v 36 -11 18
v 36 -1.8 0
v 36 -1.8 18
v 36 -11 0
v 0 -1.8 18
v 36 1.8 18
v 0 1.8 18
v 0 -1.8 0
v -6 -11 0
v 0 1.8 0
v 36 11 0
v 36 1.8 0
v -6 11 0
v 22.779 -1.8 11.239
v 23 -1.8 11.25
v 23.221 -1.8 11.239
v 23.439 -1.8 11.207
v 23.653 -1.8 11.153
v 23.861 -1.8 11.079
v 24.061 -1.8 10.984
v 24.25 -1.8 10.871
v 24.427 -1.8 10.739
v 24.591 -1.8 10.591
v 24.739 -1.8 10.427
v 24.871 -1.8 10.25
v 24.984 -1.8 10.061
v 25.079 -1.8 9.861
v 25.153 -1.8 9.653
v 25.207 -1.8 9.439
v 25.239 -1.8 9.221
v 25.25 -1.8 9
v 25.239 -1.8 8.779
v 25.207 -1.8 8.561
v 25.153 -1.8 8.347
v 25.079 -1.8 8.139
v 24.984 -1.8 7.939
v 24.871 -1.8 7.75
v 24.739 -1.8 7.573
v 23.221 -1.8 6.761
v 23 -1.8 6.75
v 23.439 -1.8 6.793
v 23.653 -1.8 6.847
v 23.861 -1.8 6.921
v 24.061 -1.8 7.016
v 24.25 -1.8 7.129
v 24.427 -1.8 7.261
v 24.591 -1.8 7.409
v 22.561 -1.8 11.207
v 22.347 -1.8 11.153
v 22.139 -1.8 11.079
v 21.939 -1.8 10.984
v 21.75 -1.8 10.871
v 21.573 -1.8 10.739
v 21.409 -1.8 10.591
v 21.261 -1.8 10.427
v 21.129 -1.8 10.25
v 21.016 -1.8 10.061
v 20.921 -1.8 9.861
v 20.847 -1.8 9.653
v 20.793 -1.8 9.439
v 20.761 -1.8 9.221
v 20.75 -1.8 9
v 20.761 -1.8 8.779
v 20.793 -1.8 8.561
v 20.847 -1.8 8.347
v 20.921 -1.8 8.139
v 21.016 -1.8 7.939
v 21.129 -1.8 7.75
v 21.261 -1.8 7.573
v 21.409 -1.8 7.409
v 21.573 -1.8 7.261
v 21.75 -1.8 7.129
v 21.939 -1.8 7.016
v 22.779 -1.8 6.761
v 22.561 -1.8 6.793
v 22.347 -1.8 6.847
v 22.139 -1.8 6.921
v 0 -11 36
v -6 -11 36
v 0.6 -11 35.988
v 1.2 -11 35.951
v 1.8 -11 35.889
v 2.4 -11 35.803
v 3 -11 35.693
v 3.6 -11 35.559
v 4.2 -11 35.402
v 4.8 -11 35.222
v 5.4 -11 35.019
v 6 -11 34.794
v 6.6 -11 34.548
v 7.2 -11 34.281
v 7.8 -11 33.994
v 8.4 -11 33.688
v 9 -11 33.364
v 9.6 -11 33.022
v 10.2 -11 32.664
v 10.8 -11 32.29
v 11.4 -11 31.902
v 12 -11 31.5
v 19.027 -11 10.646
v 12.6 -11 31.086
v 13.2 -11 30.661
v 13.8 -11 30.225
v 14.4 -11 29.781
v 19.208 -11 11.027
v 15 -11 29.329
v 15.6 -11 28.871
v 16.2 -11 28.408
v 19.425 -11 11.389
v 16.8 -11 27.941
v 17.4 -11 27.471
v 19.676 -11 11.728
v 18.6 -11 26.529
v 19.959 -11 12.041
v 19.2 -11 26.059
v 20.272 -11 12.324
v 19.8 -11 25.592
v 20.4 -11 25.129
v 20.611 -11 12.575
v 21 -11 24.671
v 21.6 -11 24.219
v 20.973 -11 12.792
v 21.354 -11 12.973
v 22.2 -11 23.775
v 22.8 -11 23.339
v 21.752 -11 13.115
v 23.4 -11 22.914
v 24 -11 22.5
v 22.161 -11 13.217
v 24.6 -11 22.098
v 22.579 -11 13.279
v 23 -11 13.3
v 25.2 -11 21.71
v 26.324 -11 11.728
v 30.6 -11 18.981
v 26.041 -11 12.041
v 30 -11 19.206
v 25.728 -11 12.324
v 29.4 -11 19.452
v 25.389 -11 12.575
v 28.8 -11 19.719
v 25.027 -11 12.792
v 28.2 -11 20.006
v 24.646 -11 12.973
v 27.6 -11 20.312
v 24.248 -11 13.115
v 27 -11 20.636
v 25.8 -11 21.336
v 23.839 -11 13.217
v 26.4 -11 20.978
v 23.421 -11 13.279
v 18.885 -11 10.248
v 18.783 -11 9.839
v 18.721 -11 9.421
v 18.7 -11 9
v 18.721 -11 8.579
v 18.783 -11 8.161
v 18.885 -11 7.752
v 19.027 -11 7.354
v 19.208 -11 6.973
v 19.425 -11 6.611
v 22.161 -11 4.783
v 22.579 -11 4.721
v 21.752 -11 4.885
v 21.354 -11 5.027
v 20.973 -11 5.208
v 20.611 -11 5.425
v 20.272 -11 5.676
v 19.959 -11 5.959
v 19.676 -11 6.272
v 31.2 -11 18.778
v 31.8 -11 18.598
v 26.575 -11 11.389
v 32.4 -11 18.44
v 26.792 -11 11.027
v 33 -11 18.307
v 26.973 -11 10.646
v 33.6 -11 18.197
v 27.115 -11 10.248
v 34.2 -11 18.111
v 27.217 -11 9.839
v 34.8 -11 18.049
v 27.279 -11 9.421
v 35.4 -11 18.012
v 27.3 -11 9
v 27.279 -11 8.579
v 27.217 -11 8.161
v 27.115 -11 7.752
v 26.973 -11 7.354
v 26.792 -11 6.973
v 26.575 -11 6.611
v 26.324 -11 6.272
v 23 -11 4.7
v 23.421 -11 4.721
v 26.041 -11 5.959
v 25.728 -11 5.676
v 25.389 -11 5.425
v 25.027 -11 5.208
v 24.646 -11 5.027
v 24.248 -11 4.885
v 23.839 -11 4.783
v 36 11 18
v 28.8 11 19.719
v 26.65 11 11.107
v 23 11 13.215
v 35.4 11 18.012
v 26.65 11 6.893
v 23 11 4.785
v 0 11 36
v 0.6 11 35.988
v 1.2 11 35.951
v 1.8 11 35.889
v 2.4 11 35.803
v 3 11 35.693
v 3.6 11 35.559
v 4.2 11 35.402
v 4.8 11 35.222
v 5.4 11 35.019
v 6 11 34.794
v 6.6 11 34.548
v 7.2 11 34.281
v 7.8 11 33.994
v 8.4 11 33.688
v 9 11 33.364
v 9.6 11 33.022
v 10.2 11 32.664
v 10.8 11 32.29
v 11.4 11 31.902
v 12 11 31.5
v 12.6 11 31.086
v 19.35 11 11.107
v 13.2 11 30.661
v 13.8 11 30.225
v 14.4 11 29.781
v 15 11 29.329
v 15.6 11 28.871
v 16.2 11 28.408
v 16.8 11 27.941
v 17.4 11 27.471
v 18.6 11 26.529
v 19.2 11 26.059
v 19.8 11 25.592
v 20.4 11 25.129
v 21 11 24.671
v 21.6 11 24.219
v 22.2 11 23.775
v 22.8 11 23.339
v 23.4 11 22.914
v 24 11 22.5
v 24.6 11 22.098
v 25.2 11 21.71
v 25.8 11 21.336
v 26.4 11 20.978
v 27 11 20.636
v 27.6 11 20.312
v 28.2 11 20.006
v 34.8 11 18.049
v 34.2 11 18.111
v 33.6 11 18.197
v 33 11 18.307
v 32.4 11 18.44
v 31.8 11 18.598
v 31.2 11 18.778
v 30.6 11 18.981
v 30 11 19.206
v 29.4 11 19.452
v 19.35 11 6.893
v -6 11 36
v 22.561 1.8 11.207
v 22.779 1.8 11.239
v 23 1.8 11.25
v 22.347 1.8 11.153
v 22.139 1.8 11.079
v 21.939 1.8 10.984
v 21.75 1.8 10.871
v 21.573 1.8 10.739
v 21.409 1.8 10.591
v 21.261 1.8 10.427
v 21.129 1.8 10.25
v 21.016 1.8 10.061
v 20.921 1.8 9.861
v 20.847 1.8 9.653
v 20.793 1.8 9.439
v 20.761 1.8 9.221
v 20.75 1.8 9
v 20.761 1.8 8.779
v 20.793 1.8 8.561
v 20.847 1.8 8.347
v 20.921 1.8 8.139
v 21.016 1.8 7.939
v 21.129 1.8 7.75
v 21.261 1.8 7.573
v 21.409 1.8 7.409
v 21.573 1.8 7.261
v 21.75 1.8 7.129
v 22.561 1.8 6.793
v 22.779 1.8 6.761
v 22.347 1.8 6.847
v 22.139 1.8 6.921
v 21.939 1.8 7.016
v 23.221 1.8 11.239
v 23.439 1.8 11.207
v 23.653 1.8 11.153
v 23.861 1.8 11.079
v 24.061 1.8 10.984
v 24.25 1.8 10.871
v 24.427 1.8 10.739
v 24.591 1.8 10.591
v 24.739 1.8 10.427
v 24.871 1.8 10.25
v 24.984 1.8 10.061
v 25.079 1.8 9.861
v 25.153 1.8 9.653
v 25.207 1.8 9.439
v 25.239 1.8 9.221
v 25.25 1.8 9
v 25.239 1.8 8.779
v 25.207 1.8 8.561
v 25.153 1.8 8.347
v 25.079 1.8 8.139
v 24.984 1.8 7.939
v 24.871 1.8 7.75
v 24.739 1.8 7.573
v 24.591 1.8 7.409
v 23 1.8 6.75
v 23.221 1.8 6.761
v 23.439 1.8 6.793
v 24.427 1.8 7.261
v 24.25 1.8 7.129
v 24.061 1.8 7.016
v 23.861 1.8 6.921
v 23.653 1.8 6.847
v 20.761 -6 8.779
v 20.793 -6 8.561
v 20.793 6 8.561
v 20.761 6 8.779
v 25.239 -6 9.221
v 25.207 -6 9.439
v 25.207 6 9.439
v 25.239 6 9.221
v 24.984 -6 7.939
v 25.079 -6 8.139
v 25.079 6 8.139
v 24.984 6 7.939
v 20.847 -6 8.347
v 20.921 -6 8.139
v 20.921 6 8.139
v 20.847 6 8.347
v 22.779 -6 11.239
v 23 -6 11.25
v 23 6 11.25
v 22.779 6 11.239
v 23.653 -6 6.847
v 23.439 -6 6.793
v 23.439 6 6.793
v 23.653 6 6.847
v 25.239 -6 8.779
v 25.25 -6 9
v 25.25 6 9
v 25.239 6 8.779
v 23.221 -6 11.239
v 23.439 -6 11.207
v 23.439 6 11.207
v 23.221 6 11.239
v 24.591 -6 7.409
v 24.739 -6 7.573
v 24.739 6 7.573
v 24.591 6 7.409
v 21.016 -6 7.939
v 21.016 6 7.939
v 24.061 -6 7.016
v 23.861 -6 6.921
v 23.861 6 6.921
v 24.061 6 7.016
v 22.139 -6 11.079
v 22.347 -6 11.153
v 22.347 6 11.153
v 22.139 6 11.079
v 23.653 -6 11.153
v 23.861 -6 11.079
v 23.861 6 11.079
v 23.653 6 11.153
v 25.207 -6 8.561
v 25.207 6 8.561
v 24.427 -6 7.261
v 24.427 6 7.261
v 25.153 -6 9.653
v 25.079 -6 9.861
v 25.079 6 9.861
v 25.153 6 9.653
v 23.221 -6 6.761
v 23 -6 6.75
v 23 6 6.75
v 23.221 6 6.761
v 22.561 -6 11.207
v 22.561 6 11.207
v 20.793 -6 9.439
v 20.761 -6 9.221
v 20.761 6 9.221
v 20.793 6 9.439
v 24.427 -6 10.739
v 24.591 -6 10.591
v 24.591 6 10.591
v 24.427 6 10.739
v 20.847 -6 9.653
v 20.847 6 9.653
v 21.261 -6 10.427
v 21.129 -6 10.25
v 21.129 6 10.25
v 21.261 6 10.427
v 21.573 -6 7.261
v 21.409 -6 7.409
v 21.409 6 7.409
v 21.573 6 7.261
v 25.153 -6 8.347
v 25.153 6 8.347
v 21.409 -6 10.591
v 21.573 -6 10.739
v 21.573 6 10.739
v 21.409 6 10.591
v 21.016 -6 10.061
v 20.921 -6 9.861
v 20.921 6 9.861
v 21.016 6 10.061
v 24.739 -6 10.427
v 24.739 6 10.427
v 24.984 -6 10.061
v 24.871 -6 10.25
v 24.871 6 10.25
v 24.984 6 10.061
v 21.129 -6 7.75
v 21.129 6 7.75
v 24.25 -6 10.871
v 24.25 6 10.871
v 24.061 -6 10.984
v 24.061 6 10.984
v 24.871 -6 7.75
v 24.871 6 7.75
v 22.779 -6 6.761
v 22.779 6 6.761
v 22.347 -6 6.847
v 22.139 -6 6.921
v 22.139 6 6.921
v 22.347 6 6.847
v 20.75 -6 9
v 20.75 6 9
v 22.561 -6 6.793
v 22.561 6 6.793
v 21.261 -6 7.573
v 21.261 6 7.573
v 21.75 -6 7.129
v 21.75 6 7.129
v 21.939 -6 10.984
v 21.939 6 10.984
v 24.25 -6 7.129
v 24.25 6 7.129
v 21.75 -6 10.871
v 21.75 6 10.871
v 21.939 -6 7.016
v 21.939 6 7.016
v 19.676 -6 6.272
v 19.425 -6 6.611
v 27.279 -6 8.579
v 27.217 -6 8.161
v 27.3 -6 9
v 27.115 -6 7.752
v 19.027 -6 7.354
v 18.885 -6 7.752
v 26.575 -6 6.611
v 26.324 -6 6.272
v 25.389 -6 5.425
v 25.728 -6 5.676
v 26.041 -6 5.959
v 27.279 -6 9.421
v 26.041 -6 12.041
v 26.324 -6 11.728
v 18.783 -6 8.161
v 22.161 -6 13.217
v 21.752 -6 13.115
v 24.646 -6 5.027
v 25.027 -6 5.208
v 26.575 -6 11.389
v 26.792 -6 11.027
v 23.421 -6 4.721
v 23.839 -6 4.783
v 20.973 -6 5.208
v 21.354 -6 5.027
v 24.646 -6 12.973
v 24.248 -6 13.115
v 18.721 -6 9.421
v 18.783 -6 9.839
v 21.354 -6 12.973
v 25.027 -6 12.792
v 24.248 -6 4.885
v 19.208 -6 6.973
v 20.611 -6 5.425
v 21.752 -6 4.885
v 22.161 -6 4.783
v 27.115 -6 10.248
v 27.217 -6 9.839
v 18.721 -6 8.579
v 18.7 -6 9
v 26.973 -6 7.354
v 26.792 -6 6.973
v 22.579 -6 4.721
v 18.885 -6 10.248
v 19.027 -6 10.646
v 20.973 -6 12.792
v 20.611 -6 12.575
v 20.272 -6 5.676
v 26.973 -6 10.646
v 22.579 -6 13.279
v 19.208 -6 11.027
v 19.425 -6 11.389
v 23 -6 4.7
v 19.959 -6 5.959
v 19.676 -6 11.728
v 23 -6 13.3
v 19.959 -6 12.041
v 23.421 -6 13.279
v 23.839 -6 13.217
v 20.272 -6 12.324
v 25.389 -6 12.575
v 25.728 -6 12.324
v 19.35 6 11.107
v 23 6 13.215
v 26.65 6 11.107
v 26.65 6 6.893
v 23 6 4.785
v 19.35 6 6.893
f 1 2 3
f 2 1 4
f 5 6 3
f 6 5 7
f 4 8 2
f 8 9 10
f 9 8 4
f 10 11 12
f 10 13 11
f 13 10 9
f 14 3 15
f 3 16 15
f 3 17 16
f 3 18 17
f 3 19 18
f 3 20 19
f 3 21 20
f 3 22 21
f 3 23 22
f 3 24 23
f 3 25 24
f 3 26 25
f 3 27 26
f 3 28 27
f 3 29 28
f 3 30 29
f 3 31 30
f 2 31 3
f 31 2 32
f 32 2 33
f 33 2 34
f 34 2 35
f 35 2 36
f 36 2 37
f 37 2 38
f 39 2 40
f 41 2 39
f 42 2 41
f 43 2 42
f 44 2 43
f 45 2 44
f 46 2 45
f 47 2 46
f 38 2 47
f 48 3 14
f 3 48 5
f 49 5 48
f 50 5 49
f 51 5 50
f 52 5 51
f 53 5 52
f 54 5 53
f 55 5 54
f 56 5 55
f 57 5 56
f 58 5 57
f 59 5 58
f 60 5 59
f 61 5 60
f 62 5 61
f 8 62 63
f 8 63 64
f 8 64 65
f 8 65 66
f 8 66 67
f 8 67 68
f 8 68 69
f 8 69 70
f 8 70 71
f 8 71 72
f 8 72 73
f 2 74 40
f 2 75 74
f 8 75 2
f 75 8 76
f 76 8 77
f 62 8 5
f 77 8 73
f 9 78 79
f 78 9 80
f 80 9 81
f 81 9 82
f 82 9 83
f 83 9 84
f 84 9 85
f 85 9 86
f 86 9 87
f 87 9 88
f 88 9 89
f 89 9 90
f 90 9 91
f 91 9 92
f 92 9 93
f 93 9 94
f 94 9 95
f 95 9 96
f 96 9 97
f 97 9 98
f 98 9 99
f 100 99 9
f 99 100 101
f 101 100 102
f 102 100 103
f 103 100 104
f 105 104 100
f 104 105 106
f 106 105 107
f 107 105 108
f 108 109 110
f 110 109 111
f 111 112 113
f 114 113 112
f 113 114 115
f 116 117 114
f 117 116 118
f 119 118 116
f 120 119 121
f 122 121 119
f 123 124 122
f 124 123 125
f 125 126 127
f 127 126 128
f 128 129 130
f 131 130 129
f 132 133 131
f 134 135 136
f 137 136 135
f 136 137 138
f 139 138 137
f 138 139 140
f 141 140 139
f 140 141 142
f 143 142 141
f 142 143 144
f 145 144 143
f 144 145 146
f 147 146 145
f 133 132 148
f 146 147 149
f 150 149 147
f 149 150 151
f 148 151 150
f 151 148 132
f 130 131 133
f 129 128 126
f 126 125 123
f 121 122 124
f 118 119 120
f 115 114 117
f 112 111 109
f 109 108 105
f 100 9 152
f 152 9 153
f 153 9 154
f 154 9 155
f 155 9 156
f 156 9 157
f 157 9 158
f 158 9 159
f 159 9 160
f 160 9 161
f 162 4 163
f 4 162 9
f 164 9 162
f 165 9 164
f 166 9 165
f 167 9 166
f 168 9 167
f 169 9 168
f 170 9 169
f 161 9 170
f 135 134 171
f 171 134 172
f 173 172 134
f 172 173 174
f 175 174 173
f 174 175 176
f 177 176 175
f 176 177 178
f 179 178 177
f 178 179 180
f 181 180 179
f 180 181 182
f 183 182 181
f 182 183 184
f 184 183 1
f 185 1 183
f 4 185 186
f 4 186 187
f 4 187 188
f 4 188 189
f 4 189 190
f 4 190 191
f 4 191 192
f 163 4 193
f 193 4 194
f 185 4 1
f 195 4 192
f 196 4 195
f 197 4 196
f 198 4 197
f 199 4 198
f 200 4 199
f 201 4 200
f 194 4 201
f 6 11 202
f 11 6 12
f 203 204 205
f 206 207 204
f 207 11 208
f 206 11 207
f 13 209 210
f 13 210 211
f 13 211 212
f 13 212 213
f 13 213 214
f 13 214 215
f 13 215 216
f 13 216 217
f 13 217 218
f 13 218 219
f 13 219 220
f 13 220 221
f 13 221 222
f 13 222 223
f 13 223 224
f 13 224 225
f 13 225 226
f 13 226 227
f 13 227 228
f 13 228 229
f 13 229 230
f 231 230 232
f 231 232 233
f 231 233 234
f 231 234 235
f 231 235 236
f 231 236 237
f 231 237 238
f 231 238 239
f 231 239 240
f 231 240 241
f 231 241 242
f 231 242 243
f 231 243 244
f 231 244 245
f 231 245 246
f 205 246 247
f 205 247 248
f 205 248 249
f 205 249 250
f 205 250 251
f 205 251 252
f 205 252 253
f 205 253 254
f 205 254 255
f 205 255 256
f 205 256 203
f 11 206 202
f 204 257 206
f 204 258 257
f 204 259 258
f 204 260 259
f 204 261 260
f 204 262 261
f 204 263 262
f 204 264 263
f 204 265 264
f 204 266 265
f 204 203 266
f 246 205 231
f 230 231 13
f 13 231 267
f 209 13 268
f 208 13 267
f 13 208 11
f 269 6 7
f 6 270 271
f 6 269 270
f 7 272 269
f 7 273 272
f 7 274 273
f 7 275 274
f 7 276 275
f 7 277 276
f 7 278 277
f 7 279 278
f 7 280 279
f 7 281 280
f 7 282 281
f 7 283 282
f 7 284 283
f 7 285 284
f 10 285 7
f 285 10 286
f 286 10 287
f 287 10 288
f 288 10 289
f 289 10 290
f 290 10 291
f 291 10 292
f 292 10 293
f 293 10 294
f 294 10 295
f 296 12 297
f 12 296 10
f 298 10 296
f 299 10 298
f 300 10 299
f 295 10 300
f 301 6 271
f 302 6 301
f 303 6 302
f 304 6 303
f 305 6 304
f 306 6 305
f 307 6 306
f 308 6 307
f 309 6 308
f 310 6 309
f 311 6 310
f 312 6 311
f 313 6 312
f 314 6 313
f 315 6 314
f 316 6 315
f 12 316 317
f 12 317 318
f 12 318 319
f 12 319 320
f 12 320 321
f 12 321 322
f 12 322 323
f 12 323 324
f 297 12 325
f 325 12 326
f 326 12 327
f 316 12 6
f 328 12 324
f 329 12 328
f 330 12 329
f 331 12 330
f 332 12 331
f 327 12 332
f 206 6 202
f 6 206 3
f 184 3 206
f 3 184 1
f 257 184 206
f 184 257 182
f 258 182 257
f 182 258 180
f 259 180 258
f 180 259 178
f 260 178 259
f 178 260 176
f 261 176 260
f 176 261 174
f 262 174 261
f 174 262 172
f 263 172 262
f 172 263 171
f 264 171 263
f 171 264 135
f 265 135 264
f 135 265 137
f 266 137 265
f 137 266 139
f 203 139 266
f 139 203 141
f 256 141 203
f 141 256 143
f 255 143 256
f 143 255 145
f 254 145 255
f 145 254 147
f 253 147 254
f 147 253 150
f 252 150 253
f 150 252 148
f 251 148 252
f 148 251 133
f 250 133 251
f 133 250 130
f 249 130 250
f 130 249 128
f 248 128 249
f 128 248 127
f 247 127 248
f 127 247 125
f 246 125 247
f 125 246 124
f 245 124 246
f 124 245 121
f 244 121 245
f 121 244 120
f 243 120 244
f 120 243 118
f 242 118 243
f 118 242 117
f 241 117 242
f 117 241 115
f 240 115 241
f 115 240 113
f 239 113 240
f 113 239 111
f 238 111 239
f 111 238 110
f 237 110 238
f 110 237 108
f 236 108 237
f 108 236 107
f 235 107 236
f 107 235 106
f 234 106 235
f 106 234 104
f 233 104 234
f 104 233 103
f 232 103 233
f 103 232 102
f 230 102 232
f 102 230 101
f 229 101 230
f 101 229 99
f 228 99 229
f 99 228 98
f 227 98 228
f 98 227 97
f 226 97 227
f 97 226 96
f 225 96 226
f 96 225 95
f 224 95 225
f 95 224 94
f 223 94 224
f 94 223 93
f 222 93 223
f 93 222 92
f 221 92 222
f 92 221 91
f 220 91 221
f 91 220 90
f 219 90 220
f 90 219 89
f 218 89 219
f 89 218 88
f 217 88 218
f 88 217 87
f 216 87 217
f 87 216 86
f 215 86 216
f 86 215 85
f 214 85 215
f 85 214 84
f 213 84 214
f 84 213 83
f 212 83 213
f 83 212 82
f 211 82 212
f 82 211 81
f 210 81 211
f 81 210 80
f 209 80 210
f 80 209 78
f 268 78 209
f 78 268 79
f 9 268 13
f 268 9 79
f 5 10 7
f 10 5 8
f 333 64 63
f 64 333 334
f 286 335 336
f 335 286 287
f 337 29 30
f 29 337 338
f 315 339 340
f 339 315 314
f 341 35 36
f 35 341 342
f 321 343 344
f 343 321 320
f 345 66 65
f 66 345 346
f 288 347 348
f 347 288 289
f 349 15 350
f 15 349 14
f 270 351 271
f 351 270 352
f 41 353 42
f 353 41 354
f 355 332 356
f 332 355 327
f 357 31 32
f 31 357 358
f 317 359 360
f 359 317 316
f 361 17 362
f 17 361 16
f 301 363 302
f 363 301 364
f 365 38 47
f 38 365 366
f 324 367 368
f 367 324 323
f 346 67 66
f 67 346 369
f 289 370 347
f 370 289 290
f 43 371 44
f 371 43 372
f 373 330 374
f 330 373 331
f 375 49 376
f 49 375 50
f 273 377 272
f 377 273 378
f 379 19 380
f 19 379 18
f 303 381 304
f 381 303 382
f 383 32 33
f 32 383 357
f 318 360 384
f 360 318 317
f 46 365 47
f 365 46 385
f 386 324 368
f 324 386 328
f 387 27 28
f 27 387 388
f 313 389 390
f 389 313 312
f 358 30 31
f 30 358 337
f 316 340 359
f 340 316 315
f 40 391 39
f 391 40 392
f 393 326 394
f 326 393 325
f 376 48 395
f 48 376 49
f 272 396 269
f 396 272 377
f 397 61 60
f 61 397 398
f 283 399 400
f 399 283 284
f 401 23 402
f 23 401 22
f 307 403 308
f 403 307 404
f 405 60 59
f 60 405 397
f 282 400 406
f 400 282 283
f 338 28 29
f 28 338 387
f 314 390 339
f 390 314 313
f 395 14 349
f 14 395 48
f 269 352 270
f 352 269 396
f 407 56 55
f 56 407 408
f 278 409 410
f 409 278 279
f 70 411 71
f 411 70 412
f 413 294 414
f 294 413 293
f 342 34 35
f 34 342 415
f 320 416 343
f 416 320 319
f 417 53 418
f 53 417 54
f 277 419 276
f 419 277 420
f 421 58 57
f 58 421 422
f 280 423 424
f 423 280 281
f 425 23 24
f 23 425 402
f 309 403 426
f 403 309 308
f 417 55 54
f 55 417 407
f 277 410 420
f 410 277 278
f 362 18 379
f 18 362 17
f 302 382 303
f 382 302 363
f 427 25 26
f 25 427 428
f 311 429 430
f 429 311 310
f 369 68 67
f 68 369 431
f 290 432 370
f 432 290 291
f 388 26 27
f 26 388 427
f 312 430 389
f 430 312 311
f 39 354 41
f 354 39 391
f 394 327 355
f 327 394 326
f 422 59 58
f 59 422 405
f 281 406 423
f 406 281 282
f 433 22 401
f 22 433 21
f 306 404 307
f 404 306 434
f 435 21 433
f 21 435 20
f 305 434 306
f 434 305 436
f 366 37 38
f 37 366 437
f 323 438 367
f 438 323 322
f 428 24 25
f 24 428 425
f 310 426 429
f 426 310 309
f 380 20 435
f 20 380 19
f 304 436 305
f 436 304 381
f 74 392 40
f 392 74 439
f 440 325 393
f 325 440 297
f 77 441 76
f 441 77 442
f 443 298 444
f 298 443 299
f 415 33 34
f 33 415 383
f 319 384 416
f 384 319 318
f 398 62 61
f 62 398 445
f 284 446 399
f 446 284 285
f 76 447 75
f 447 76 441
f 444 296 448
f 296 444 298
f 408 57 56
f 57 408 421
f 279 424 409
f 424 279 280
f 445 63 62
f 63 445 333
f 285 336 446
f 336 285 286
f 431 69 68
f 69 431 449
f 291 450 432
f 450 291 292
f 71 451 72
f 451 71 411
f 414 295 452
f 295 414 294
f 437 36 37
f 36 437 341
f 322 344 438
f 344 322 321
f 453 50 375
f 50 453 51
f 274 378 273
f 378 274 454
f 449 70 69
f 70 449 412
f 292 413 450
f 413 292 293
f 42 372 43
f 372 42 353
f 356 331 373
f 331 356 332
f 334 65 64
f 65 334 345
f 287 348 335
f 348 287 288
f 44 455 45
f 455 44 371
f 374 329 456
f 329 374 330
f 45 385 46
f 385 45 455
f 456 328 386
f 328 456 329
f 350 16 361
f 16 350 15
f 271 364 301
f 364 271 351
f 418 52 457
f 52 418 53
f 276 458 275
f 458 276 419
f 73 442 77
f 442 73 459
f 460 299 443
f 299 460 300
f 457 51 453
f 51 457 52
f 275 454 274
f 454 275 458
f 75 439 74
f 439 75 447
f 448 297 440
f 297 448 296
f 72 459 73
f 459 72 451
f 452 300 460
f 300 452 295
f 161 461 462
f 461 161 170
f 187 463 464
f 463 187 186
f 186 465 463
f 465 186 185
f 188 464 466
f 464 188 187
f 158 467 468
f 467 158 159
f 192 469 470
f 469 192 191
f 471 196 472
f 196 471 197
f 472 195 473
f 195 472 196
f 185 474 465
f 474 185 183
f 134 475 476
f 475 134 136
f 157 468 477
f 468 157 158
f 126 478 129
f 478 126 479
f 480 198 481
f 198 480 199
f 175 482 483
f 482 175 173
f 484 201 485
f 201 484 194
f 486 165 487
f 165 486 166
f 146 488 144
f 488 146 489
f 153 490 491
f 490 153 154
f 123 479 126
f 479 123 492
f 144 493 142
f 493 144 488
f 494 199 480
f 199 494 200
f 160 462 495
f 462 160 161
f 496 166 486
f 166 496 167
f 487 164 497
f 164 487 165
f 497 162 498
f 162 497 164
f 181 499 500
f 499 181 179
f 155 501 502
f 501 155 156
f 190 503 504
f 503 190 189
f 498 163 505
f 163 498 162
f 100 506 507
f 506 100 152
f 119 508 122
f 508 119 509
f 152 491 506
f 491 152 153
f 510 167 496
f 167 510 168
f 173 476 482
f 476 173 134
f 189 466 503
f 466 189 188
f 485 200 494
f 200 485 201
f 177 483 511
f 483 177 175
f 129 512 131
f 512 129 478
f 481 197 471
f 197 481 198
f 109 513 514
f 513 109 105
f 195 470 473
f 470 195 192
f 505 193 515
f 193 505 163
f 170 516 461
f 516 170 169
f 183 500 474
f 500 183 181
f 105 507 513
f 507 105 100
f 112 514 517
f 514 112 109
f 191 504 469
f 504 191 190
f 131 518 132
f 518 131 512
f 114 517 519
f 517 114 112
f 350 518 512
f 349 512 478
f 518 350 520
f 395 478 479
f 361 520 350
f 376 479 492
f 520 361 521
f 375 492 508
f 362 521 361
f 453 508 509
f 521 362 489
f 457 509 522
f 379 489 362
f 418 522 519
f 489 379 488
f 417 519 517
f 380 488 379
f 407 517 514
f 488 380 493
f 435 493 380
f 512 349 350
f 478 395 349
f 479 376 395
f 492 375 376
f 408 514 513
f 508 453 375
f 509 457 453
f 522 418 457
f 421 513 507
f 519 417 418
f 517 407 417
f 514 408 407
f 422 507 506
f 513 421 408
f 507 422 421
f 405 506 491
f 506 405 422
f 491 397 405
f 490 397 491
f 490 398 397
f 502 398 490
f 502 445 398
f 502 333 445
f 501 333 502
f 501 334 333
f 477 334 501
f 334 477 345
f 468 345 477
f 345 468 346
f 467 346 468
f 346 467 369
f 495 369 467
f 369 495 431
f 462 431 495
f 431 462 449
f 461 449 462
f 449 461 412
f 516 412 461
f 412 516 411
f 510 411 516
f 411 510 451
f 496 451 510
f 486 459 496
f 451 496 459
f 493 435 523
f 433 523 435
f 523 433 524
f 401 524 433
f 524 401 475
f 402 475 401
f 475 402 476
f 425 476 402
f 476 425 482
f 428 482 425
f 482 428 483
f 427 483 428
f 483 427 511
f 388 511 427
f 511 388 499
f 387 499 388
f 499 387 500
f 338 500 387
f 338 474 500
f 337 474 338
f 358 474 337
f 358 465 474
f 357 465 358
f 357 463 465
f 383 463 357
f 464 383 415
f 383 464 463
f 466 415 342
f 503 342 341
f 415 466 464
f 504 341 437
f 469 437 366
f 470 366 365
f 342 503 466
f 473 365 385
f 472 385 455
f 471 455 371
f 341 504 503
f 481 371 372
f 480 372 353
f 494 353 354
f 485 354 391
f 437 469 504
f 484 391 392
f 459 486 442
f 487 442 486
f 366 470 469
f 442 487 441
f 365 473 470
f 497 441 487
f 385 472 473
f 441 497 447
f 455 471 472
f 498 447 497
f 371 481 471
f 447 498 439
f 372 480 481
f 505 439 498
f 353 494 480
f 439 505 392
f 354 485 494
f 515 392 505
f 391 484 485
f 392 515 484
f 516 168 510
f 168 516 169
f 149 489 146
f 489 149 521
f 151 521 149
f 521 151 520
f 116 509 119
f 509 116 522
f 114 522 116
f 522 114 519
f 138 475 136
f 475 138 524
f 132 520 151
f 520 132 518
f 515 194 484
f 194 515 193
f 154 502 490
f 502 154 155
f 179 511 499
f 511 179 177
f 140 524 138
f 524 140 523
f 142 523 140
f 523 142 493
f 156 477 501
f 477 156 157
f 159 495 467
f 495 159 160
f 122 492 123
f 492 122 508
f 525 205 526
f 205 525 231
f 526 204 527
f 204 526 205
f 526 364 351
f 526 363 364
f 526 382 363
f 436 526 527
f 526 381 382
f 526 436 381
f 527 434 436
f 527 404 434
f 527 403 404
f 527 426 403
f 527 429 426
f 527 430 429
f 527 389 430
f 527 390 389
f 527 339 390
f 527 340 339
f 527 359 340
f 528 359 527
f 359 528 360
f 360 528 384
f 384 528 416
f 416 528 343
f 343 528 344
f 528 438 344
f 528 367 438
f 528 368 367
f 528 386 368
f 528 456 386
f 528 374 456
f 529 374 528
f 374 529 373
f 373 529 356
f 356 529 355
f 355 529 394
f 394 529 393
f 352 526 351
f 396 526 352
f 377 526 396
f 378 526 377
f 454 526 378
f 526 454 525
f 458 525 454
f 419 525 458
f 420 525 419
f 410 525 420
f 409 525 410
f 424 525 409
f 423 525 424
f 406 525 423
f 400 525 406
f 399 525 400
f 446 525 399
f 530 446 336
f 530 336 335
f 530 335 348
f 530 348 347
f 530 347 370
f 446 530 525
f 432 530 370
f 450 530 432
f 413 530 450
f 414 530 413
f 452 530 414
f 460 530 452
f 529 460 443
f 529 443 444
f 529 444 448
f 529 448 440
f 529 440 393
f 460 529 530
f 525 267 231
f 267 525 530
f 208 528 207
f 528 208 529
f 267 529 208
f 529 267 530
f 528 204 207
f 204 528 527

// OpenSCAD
// Batente v5 para a ponta do suporte das cadeiras (OpenSCAD)
// Eixos: X ao longo do suporte (X=0 na ponta, cresce para dentro do suporte),
//        Y na largura (centrado), Z para cima (Z=0 no fundo do canal).
// Medidas em mm. Parafuso M4 x 16 + porca M4. Cavidades com o formato exato.
// O suporte nao tem paredes externas: a peca tem 22 mm de largura em todos os pontos.

$fn = 64;

// ---------- Medidas do suporte ----------
LARG      = 22;     // largura total (tambem a largura da peca)
DIV       = 3;      // divisao do meio
ALT_CANAL = 18;     // altura do canal
FURO_X    = 23;     // centro do furo de 5 mm, a partir da ponta

// ---------- Parametros da peca ----------
FOLGA      = 0.3;   // folga de encaixe para impressao 3D
ESP_PAREDE = 6;     // espessura da parede na ponta (X de -6 a 0)
ALT_PAREDE = 18;    // altura da parede acima do canal
COMP_GARRA = 36;    // comprimento das garras dentro dos canais

// ---------- Parafuso M4 x 16 e porca M4 ----------
FURO_D     = 4.5;   // furo passante M4
CABECA_D   = 8.6;   // cabeca panela M4 (8,0) + folga
CABECA_PROF = 5.0;  // cabeca panela (3,1) ou cilindrica (4,0) fica rebaixada
PORCA_AF   = 7.3;   // porca M4: 7,0 entre faces + folga
PORCA_PROF = 5.0;   // porca M4 (3,2) encostada no fundo; M4x16 atravessa a porca inteira

// ---------- Derivados ----------
VAO        = DIV + 2*FOLGA;             // vao central onde passa a divisao
LARG_GARRA = (LARG - VAO) / 2;          // cada garra vai da borda de 22 mm ate o vao
Y_CENTRO   = VAO/2 + LARG_GARRA/2;      // centro de cada garra
Y_EXT      = LARG/2;                    // face externa da garra (|Y| = 11)
Z_FURO     = ALT_CANAL/2;
R_PORCA    = PORCA_AF / sqrt(3);        // raio circunscrito do sextavado
TOPO       = ALT_CANAL + ALT_PAREDE;

// ---------- Perfil lateral: parede + rampa que termina rente ao topo do canal ----------
N = 60;
rampa = [ for (i = [0:N]) let(t = i/N)
          [ COMP_GARRA*t, ALT_CANAL + ALT_PAREDE*0.5*(1 + cos(180*t)) ] ];
perfil = concat([[-ESP_PAREDE, 0], [-ESP_PAREDE, TOPO]],
                rampa,
                [[COMP_GARRA, ALT_CANAL], [0, ALT_CANAL], [0, 0]]);

module cabeca() {
    // perfil em XZ extrudado ao longo de Y, centrado
    rotate([90, 0, 0]) linear_extrude(height = LARG, center = true) polygon(perfil);
}

module garras() {
    // duas garras com largura total de 22 mm e vao no meio para a divisao
    for (lado = [-1, 1])
        translate([-0.5, lado*Y_CENTRO - LARG_GARRA/2, 0])
            cube([COMP_GARRA + 0.5, LARG_GARRA, ALT_CANAL]);
}

module furo_parafuso() {
    translate([FURO_X, 0, Z_FURO]) rotate([90, 0, 0])
        cylinder(d = FURO_D, h = LARG + 4, center = true);
}

module rebaixo_cabeca() {   // cilindro exato, no lado -Y
    translate([FURO_X, -Y_EXT - 0.01, Z_FURO]) rotate([-90, 0, 0])
        cylinder(d = CABECA_D, h = CABECA_PROF + 0.01);
}

module sextavado_porca() {  // sextavado exato, no lado +Y
    translate([FURO_X, Y_EXT + 0.01, Z_FURO]) rotate([90, 0, 0])
        rotate([0, 0, 30])  // cantos para cima/baixo, faces planas nas laterais
            cylinder(r = R_PORCA, h = PORCA_PROF + 0.01, $fn = 6);
}

difference() {
    union() { cabeca(); garras(); }
    furo_parafuso();
    rebaixo_cabeca();
    sextavado_porca();
}
